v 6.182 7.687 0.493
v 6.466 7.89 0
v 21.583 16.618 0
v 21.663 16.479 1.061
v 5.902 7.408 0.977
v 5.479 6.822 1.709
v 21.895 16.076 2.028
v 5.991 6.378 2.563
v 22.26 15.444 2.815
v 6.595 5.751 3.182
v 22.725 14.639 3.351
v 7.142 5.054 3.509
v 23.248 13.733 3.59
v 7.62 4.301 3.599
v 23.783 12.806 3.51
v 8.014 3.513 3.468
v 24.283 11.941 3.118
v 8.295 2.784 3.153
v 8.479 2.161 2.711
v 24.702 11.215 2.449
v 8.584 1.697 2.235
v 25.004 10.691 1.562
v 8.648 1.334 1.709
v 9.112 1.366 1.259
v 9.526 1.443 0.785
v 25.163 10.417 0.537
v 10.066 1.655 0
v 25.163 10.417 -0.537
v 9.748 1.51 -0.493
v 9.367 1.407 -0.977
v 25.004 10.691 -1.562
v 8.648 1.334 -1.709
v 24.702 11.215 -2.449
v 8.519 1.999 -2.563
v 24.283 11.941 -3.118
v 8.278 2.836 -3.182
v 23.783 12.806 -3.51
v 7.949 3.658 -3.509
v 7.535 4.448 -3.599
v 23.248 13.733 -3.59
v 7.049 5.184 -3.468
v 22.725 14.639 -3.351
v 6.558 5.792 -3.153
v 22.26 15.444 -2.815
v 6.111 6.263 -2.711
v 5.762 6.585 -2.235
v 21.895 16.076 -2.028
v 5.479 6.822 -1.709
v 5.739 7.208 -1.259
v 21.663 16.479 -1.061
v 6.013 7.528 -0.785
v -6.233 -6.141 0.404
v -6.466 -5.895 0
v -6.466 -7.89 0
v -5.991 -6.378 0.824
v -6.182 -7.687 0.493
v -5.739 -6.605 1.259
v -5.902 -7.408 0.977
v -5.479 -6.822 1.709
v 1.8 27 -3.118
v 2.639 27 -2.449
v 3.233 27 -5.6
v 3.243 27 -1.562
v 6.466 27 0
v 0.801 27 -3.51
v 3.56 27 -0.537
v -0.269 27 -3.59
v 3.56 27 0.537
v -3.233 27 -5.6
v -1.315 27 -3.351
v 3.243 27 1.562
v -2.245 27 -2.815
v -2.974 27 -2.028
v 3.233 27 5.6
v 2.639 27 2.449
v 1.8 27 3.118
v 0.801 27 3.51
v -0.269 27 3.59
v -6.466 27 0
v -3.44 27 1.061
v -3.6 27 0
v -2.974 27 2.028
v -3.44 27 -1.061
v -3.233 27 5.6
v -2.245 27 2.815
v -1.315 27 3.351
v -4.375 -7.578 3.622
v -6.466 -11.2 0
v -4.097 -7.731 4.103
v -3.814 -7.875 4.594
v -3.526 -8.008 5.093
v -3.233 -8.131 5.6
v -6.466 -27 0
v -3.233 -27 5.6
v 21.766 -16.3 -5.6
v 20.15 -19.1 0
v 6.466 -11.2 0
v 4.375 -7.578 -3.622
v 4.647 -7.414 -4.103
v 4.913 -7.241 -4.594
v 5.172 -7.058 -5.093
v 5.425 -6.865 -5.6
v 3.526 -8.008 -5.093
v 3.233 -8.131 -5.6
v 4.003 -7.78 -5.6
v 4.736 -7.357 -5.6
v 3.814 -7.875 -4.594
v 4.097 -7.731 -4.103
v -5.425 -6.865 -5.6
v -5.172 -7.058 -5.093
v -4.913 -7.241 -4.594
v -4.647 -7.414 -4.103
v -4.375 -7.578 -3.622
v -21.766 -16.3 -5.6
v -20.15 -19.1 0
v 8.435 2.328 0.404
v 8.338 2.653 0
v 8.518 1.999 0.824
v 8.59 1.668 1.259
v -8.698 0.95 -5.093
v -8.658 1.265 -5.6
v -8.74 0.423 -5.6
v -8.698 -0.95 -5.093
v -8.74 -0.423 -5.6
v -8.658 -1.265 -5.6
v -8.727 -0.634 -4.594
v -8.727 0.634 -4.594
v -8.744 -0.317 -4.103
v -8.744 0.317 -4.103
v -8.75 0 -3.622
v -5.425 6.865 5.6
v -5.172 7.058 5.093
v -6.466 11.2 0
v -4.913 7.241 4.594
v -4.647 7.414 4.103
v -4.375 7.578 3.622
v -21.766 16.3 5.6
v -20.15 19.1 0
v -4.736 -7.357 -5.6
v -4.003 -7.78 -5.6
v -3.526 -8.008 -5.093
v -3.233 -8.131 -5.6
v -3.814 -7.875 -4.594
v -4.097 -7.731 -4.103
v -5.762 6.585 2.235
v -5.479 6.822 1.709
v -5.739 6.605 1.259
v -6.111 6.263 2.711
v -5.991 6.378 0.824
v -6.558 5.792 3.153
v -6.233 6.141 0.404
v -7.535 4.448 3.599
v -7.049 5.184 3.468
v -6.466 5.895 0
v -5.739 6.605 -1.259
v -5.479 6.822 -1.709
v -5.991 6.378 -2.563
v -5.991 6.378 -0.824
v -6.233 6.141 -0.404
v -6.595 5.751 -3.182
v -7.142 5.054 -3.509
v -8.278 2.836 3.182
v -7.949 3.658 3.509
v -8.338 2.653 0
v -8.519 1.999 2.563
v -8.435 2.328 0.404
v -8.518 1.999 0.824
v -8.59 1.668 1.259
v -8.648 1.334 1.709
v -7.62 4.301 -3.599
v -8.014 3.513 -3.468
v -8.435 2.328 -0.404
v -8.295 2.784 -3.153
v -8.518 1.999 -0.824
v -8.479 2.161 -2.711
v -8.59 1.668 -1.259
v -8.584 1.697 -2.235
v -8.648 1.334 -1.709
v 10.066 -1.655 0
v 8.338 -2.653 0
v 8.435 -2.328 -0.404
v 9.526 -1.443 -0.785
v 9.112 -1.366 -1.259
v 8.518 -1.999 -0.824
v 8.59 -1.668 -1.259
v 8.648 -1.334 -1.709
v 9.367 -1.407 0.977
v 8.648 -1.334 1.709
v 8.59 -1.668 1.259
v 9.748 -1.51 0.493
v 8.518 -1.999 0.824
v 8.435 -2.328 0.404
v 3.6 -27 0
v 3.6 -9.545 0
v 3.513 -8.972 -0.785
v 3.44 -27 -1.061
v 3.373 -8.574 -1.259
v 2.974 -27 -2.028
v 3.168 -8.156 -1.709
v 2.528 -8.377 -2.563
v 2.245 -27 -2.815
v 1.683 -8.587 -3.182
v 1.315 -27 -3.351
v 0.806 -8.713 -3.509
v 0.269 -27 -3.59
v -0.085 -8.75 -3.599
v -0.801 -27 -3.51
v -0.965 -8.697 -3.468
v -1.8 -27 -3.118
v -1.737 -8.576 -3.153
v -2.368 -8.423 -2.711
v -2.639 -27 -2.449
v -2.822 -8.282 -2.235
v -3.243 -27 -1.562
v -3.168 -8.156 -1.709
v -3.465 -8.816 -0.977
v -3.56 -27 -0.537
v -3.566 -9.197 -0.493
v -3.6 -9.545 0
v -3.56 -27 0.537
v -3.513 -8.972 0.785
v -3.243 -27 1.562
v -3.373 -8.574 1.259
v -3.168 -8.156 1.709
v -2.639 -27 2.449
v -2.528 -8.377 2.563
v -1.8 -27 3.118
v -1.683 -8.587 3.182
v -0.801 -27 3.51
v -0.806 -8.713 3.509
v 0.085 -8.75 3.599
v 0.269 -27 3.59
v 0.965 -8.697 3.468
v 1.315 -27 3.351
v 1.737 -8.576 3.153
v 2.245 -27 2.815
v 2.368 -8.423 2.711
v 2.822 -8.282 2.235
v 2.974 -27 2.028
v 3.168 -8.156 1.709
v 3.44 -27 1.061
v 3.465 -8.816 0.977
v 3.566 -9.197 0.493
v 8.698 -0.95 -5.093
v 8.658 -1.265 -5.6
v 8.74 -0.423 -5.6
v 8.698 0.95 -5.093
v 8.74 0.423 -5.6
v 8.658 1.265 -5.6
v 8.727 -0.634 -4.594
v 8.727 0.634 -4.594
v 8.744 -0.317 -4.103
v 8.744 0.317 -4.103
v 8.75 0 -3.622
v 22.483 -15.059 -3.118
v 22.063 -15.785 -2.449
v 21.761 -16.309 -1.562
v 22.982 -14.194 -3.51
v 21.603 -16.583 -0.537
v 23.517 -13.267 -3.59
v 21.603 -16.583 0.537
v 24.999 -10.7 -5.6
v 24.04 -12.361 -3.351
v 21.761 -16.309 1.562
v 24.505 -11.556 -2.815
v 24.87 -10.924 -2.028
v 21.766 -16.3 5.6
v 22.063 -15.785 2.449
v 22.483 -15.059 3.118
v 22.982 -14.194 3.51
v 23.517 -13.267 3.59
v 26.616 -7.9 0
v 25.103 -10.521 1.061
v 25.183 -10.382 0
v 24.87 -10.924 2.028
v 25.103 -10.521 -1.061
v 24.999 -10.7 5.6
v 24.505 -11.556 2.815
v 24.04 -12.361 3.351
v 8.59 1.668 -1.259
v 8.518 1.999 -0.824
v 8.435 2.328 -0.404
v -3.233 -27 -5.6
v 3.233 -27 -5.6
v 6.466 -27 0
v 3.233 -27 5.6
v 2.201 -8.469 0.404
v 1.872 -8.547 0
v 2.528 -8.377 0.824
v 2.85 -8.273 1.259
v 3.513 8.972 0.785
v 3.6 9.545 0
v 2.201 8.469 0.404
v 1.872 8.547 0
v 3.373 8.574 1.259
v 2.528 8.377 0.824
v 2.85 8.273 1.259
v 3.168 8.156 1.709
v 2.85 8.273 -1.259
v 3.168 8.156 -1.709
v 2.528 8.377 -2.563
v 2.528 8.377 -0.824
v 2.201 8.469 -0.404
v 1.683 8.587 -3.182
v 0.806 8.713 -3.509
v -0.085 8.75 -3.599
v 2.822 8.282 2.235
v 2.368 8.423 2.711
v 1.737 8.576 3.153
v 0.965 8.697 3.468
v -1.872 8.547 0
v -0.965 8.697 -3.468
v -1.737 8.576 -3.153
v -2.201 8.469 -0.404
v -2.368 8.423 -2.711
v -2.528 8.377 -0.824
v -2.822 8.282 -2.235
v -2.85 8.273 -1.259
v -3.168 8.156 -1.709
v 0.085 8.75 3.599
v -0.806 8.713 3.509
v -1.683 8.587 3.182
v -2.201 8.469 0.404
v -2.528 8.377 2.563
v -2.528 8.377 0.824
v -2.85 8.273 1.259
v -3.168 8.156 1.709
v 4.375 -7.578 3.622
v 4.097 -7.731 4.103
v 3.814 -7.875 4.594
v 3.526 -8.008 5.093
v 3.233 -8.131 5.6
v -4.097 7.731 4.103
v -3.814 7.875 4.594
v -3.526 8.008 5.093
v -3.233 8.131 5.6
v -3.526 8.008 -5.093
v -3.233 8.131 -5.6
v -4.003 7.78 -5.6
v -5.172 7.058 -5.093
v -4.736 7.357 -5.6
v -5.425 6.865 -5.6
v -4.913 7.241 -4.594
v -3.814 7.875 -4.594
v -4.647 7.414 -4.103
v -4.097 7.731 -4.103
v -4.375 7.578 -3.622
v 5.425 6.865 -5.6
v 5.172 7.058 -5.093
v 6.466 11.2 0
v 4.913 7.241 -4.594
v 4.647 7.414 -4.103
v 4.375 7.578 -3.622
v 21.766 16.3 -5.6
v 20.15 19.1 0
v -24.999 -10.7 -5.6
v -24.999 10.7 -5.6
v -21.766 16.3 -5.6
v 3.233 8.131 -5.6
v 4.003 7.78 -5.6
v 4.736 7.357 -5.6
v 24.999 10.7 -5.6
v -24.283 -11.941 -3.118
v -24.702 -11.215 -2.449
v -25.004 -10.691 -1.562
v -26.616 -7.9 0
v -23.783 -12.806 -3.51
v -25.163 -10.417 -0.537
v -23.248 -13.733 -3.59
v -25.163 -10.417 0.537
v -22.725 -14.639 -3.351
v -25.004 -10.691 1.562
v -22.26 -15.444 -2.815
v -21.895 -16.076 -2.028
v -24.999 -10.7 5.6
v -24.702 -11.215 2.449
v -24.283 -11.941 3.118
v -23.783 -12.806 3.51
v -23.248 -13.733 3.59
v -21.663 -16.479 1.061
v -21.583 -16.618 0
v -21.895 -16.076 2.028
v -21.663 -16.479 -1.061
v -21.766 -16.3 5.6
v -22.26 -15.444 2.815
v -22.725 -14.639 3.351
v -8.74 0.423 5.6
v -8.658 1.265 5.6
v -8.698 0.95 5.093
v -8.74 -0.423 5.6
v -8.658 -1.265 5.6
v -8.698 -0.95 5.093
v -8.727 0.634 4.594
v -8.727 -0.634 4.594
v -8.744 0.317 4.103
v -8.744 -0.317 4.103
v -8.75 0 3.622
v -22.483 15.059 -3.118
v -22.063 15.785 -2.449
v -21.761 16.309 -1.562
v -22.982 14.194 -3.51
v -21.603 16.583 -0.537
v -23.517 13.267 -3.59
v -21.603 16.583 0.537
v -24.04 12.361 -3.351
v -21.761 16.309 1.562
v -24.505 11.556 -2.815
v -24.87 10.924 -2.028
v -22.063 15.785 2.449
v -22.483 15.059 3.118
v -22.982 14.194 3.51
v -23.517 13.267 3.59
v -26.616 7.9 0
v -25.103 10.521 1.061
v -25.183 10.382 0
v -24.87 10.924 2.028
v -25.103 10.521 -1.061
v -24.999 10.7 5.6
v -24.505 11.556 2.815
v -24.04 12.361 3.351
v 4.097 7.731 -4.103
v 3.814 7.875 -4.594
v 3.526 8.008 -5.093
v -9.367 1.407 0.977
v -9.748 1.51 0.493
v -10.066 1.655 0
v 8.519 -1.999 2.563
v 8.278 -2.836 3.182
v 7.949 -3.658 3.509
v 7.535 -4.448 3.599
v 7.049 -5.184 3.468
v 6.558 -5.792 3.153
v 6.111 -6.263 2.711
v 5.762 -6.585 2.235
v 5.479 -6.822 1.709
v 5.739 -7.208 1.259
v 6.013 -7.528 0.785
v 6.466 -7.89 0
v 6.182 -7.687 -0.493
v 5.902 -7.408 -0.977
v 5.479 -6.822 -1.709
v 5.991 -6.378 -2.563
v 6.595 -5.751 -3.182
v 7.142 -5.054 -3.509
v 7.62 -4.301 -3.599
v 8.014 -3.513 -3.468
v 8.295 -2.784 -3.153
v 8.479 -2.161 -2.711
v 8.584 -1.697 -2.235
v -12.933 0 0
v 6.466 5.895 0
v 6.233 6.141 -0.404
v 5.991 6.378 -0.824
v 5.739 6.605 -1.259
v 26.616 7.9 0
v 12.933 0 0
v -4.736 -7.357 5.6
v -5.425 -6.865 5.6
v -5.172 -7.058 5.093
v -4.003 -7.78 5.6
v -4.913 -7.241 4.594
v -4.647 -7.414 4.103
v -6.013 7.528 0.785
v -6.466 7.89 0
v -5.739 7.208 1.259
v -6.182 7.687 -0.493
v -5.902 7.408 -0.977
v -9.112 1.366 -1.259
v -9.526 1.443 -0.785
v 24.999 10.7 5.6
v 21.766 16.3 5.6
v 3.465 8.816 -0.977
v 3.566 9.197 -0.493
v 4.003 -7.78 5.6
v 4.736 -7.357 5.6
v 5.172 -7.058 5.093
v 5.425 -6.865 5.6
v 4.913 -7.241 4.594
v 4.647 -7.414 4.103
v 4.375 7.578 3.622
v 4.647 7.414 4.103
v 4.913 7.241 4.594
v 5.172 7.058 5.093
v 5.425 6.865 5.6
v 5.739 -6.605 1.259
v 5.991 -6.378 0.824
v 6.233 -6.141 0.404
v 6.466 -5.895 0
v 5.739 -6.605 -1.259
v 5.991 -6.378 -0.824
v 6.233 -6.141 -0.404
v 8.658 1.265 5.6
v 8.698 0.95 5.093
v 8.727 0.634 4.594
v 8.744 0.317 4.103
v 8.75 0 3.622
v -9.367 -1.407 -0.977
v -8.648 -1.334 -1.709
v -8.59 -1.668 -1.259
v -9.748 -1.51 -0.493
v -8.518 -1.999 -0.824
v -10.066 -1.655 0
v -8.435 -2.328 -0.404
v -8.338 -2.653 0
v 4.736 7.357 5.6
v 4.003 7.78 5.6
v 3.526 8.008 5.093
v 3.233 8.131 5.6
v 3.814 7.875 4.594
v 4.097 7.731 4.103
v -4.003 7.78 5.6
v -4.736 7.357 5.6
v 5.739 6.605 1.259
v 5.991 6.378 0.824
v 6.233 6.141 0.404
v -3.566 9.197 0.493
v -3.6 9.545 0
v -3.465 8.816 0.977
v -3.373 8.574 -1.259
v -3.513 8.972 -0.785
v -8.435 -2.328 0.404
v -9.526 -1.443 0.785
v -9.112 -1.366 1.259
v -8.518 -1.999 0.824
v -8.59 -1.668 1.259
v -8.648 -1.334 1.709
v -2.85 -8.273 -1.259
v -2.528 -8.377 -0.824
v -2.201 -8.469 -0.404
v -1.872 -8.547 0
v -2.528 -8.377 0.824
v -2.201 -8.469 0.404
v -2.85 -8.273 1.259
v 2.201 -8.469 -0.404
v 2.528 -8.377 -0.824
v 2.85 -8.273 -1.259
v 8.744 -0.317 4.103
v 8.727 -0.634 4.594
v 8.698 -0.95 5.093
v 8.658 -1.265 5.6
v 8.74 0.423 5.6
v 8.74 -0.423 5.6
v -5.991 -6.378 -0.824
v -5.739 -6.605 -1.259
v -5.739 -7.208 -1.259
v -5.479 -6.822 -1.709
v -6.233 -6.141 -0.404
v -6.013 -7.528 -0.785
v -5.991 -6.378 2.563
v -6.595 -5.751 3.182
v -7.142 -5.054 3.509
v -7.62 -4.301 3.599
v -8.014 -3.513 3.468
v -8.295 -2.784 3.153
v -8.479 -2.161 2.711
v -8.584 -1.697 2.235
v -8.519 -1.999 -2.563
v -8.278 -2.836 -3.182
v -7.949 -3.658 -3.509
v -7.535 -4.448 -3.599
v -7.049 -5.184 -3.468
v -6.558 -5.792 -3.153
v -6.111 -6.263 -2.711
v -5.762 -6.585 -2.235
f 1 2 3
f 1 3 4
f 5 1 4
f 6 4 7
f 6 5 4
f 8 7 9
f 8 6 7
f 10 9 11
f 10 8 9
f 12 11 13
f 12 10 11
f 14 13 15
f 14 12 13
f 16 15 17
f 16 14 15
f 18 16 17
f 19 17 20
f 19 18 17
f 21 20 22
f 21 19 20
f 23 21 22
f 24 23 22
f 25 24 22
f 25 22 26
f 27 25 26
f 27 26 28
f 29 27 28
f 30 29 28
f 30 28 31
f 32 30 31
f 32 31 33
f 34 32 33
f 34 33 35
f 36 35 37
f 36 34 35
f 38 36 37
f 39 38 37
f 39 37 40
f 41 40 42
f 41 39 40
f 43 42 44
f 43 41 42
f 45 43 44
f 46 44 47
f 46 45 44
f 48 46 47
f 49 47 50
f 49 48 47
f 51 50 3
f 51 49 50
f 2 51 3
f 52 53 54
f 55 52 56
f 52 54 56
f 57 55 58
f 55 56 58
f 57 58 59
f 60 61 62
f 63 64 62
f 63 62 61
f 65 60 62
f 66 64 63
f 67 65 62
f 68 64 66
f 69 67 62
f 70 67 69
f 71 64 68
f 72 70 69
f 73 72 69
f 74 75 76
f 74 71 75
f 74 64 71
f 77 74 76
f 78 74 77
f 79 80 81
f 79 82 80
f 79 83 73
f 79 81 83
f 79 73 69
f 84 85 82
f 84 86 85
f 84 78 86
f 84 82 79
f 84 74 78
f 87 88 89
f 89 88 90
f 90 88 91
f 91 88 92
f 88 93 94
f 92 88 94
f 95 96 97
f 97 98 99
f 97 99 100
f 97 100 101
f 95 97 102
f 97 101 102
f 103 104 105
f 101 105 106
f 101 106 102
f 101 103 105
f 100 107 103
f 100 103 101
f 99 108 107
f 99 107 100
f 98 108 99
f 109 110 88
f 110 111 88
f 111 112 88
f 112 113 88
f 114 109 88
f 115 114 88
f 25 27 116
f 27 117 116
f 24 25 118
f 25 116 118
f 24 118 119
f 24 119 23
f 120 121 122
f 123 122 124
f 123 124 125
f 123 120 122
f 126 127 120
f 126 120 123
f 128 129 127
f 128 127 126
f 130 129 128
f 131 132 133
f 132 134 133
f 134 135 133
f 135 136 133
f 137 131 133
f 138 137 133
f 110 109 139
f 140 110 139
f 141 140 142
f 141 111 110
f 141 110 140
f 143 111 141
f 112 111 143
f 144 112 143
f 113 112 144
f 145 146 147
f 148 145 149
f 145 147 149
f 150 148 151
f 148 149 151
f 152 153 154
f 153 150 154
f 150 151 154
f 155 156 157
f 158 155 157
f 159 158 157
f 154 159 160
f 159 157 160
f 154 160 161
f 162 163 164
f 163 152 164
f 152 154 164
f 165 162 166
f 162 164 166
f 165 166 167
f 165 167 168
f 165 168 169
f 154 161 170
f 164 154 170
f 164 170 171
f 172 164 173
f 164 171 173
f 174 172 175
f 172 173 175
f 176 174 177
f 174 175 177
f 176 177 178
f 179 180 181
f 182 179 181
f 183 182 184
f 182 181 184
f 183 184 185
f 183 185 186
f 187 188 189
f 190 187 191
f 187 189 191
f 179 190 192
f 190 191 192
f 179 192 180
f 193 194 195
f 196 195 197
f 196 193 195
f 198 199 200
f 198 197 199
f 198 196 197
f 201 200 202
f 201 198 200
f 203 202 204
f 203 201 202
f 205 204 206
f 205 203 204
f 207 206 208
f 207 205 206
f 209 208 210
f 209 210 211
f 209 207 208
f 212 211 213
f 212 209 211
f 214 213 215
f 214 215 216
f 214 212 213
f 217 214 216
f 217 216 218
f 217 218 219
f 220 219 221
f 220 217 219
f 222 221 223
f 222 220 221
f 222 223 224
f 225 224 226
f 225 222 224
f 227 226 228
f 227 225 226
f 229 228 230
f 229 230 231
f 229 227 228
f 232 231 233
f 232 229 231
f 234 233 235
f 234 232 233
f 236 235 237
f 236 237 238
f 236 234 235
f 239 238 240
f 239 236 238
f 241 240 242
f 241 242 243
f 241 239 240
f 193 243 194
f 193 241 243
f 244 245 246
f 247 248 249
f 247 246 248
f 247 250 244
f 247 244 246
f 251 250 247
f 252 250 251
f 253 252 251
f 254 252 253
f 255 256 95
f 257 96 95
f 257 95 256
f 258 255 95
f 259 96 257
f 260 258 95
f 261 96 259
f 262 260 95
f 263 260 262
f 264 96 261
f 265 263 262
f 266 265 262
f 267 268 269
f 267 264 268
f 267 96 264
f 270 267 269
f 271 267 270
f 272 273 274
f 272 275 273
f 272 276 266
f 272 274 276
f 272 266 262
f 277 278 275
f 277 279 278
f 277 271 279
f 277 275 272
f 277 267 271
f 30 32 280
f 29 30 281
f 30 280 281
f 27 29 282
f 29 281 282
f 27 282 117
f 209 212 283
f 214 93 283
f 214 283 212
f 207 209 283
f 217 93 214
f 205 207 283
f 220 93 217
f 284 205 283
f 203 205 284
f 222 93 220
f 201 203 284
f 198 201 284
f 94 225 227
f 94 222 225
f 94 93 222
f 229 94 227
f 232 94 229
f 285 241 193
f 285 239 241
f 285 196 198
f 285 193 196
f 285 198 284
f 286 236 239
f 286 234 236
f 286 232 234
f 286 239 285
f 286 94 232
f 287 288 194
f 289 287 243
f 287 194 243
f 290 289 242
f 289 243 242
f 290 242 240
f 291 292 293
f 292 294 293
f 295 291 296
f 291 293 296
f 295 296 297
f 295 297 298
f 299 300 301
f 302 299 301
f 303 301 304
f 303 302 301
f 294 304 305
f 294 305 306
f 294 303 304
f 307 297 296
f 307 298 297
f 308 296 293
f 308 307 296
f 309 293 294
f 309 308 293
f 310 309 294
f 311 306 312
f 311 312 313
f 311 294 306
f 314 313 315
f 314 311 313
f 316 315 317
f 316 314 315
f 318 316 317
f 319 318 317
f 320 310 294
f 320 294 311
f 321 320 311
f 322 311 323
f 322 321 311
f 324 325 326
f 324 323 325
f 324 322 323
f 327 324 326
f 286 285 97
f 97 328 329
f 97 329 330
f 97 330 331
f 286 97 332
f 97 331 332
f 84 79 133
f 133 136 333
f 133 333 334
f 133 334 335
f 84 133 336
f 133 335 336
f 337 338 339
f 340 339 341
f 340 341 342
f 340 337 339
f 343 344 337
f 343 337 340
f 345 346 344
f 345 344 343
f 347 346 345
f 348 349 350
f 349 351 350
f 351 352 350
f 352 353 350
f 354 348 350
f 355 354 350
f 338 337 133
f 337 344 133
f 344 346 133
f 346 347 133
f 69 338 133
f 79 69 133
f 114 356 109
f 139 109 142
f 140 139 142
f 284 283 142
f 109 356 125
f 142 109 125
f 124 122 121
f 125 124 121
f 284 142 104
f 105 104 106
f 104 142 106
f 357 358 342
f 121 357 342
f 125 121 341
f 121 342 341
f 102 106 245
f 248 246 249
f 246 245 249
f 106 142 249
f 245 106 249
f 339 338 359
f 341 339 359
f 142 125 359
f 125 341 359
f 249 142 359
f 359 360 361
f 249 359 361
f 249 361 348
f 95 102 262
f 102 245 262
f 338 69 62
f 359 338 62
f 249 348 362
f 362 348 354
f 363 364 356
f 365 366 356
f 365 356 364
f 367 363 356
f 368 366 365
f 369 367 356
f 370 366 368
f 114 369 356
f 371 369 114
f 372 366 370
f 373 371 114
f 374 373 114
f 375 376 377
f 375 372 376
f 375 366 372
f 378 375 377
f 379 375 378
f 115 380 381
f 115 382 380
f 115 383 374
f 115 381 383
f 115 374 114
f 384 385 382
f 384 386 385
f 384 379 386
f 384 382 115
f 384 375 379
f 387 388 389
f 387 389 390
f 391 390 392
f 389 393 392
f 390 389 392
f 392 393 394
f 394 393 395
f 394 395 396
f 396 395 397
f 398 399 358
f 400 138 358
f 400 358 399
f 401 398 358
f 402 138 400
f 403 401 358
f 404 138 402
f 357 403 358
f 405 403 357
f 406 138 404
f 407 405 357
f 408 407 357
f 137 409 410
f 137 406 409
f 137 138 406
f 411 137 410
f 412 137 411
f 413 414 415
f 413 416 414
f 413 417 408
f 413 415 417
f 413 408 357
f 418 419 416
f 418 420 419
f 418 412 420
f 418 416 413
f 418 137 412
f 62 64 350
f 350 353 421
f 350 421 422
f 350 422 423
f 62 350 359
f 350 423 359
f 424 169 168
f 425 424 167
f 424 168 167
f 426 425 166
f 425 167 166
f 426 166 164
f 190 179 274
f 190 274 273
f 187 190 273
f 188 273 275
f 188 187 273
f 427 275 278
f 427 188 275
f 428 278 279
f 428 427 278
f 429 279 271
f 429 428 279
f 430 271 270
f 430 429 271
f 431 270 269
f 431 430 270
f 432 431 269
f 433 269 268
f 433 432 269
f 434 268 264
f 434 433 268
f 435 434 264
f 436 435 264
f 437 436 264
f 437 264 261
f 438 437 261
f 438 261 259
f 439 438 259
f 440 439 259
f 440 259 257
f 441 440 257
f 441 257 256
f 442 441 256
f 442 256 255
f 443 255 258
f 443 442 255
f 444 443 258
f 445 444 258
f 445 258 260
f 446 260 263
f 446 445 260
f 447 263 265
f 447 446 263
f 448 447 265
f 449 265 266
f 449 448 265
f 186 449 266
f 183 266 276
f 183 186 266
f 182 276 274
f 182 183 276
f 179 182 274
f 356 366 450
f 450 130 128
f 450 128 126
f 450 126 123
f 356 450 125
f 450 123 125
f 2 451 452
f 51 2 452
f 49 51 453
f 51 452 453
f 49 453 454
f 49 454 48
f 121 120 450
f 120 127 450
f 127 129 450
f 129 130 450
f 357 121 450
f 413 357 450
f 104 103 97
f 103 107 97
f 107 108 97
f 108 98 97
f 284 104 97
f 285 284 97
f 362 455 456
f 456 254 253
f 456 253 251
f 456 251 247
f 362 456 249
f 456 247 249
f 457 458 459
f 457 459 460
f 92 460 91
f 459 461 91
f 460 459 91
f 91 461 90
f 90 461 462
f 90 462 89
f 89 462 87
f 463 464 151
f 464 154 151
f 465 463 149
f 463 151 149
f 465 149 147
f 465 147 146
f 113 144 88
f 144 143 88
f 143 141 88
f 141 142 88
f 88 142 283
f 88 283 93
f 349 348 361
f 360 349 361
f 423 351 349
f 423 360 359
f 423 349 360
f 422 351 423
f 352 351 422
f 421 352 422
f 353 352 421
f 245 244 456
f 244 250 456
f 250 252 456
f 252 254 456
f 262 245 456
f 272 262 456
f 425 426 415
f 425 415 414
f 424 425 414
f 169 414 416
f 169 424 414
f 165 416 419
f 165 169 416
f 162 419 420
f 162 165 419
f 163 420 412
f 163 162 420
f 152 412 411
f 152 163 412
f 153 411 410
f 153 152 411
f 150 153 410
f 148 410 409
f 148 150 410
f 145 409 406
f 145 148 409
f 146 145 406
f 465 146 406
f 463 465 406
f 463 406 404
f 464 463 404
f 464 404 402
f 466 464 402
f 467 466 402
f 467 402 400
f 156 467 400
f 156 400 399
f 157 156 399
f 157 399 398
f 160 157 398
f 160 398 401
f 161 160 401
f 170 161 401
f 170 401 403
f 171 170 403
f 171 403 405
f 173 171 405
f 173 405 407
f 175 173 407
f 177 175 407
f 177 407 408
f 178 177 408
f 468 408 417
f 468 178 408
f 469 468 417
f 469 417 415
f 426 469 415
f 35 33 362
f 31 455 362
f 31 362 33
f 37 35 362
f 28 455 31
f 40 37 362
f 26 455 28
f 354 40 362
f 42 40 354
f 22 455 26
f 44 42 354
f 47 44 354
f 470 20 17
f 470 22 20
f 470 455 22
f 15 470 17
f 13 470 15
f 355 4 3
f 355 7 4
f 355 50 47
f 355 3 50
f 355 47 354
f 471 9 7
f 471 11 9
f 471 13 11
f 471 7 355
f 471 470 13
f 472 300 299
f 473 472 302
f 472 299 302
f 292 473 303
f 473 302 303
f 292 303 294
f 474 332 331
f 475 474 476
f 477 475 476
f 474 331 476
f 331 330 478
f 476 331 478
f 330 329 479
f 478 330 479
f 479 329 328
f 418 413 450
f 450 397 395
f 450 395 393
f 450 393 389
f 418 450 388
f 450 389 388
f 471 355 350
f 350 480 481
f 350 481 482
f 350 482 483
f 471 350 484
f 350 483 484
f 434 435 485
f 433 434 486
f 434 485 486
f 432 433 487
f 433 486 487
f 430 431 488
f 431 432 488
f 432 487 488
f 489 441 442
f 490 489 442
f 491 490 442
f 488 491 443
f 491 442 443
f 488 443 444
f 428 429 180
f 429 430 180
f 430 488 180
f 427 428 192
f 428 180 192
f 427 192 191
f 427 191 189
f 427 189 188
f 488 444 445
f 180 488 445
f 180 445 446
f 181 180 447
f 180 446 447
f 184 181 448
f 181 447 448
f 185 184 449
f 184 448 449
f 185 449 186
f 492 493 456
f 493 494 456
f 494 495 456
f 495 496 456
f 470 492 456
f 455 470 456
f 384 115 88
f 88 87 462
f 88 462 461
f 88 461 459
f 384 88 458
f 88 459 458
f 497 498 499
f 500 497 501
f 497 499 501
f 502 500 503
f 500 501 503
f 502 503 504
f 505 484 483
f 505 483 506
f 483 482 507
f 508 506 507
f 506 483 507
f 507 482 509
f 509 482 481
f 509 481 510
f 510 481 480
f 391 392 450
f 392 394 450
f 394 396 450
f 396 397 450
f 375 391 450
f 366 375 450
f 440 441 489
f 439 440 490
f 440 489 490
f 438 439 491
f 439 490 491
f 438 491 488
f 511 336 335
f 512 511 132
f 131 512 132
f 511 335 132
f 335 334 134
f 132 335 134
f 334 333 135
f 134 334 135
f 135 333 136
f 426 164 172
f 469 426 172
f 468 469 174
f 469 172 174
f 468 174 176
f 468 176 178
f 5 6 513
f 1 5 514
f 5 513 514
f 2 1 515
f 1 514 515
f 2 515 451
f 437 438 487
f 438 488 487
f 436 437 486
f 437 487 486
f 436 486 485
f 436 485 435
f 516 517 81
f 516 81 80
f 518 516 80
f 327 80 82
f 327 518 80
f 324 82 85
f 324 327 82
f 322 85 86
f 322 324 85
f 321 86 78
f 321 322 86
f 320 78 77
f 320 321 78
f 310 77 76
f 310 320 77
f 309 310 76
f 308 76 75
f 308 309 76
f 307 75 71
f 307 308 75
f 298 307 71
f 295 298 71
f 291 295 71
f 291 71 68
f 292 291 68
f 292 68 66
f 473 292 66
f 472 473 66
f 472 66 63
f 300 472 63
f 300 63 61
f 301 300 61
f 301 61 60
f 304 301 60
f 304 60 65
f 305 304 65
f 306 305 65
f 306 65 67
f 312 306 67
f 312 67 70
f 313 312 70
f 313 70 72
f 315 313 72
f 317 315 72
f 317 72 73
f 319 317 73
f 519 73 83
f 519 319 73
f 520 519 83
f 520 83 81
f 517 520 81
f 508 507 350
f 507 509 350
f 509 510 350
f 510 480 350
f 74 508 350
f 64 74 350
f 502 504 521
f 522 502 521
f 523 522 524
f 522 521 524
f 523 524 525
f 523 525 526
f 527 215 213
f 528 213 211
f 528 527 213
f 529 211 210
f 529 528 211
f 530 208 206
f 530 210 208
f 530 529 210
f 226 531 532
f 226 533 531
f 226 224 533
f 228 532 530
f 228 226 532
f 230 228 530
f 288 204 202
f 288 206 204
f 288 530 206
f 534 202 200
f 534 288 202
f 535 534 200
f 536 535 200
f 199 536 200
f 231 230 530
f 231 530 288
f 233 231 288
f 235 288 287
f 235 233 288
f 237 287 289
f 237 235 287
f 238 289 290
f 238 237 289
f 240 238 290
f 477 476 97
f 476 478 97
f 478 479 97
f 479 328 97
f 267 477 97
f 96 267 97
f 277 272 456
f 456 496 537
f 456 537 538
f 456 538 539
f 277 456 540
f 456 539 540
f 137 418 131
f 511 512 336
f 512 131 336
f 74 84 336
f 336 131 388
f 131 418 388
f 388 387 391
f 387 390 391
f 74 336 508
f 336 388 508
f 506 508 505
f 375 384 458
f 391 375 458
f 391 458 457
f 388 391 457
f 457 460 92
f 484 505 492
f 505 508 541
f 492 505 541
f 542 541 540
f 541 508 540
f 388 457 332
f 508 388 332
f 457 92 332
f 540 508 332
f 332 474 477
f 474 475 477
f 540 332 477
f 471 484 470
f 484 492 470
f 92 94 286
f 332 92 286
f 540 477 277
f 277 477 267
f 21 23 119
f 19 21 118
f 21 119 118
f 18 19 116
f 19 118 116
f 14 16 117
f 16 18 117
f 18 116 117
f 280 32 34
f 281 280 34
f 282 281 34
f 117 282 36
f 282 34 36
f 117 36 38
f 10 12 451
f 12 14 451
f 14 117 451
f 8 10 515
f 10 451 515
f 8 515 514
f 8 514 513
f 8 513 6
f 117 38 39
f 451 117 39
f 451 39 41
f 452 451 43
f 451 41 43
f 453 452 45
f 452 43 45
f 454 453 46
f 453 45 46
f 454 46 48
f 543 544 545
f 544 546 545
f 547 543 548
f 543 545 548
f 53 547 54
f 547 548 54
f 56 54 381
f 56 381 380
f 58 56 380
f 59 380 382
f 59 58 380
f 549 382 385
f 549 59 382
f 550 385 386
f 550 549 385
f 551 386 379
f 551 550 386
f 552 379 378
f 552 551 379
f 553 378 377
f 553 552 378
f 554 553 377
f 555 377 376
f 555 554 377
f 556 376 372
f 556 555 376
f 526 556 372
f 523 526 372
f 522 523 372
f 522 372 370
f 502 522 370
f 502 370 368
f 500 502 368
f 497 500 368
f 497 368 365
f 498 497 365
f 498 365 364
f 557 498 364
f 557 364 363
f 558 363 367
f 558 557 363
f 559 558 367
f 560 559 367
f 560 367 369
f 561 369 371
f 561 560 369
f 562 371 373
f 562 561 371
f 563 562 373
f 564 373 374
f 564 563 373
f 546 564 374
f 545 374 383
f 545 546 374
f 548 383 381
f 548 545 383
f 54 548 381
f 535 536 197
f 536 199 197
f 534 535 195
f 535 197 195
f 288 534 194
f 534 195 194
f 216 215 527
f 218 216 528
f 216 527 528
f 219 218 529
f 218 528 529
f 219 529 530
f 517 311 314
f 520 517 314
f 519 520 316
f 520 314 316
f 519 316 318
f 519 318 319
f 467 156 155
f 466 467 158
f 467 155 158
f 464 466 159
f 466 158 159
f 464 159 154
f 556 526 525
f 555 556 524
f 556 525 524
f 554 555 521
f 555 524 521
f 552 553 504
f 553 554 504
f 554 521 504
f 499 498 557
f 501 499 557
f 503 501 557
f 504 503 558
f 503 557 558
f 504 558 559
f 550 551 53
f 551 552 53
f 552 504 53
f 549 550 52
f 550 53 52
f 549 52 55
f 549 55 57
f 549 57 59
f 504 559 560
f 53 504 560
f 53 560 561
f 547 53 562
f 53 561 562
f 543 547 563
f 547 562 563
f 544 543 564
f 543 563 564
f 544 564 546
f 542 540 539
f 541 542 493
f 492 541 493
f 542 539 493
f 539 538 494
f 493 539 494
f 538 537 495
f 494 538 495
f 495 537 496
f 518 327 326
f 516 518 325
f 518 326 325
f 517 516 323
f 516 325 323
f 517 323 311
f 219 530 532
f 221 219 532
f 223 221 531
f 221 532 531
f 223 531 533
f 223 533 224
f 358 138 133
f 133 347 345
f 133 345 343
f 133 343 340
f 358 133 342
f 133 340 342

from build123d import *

# Parameters (mm, degrees)
F0_R          = 3.6
F1_DEPTH      = 27
F2_COUNT      = 6
F3_R          = 8.75
F4_DEPTH      = 5.6
F4_DEPTH_BACK = 5.6


with BuildPart() as f1:
    # F0 (on Front) → F1 (new body)
    with BuildSketch(Plane.XZ):
        Polygon((-3.233162, -5.6), (3.233162, -5.6), (6.466323, 0), (3.233162, 5.6), (-3.233162, 5.6), (-6.466323, 0), align=None)
        Circle(F0_R, mode=Mode.SUBTRACT)
    extrude(amount=F1_DEPTH)

    # F2: F1 ×6 about axis
    f2_axis = Axis((0, 0, 14.441719), (0, 0, 1))


with BuildPart() as f1_1:
    add(f1.part)
    for i in range(1, F2_COUNT):
        add(f1.part.rotate(f2_axis, i * 360 / F2_COUNT))

    # F3 (on Top) → F4 (join, two sides)
    with BuildSketch(Plane.XY) as f4_sk:
        Circle(F3_R)
    extrude(amount=F4_DEPTH)
    extrude(f4_sk.sketch, amount=-F4_DEPTH_BACK)


solid = f1_1.part
